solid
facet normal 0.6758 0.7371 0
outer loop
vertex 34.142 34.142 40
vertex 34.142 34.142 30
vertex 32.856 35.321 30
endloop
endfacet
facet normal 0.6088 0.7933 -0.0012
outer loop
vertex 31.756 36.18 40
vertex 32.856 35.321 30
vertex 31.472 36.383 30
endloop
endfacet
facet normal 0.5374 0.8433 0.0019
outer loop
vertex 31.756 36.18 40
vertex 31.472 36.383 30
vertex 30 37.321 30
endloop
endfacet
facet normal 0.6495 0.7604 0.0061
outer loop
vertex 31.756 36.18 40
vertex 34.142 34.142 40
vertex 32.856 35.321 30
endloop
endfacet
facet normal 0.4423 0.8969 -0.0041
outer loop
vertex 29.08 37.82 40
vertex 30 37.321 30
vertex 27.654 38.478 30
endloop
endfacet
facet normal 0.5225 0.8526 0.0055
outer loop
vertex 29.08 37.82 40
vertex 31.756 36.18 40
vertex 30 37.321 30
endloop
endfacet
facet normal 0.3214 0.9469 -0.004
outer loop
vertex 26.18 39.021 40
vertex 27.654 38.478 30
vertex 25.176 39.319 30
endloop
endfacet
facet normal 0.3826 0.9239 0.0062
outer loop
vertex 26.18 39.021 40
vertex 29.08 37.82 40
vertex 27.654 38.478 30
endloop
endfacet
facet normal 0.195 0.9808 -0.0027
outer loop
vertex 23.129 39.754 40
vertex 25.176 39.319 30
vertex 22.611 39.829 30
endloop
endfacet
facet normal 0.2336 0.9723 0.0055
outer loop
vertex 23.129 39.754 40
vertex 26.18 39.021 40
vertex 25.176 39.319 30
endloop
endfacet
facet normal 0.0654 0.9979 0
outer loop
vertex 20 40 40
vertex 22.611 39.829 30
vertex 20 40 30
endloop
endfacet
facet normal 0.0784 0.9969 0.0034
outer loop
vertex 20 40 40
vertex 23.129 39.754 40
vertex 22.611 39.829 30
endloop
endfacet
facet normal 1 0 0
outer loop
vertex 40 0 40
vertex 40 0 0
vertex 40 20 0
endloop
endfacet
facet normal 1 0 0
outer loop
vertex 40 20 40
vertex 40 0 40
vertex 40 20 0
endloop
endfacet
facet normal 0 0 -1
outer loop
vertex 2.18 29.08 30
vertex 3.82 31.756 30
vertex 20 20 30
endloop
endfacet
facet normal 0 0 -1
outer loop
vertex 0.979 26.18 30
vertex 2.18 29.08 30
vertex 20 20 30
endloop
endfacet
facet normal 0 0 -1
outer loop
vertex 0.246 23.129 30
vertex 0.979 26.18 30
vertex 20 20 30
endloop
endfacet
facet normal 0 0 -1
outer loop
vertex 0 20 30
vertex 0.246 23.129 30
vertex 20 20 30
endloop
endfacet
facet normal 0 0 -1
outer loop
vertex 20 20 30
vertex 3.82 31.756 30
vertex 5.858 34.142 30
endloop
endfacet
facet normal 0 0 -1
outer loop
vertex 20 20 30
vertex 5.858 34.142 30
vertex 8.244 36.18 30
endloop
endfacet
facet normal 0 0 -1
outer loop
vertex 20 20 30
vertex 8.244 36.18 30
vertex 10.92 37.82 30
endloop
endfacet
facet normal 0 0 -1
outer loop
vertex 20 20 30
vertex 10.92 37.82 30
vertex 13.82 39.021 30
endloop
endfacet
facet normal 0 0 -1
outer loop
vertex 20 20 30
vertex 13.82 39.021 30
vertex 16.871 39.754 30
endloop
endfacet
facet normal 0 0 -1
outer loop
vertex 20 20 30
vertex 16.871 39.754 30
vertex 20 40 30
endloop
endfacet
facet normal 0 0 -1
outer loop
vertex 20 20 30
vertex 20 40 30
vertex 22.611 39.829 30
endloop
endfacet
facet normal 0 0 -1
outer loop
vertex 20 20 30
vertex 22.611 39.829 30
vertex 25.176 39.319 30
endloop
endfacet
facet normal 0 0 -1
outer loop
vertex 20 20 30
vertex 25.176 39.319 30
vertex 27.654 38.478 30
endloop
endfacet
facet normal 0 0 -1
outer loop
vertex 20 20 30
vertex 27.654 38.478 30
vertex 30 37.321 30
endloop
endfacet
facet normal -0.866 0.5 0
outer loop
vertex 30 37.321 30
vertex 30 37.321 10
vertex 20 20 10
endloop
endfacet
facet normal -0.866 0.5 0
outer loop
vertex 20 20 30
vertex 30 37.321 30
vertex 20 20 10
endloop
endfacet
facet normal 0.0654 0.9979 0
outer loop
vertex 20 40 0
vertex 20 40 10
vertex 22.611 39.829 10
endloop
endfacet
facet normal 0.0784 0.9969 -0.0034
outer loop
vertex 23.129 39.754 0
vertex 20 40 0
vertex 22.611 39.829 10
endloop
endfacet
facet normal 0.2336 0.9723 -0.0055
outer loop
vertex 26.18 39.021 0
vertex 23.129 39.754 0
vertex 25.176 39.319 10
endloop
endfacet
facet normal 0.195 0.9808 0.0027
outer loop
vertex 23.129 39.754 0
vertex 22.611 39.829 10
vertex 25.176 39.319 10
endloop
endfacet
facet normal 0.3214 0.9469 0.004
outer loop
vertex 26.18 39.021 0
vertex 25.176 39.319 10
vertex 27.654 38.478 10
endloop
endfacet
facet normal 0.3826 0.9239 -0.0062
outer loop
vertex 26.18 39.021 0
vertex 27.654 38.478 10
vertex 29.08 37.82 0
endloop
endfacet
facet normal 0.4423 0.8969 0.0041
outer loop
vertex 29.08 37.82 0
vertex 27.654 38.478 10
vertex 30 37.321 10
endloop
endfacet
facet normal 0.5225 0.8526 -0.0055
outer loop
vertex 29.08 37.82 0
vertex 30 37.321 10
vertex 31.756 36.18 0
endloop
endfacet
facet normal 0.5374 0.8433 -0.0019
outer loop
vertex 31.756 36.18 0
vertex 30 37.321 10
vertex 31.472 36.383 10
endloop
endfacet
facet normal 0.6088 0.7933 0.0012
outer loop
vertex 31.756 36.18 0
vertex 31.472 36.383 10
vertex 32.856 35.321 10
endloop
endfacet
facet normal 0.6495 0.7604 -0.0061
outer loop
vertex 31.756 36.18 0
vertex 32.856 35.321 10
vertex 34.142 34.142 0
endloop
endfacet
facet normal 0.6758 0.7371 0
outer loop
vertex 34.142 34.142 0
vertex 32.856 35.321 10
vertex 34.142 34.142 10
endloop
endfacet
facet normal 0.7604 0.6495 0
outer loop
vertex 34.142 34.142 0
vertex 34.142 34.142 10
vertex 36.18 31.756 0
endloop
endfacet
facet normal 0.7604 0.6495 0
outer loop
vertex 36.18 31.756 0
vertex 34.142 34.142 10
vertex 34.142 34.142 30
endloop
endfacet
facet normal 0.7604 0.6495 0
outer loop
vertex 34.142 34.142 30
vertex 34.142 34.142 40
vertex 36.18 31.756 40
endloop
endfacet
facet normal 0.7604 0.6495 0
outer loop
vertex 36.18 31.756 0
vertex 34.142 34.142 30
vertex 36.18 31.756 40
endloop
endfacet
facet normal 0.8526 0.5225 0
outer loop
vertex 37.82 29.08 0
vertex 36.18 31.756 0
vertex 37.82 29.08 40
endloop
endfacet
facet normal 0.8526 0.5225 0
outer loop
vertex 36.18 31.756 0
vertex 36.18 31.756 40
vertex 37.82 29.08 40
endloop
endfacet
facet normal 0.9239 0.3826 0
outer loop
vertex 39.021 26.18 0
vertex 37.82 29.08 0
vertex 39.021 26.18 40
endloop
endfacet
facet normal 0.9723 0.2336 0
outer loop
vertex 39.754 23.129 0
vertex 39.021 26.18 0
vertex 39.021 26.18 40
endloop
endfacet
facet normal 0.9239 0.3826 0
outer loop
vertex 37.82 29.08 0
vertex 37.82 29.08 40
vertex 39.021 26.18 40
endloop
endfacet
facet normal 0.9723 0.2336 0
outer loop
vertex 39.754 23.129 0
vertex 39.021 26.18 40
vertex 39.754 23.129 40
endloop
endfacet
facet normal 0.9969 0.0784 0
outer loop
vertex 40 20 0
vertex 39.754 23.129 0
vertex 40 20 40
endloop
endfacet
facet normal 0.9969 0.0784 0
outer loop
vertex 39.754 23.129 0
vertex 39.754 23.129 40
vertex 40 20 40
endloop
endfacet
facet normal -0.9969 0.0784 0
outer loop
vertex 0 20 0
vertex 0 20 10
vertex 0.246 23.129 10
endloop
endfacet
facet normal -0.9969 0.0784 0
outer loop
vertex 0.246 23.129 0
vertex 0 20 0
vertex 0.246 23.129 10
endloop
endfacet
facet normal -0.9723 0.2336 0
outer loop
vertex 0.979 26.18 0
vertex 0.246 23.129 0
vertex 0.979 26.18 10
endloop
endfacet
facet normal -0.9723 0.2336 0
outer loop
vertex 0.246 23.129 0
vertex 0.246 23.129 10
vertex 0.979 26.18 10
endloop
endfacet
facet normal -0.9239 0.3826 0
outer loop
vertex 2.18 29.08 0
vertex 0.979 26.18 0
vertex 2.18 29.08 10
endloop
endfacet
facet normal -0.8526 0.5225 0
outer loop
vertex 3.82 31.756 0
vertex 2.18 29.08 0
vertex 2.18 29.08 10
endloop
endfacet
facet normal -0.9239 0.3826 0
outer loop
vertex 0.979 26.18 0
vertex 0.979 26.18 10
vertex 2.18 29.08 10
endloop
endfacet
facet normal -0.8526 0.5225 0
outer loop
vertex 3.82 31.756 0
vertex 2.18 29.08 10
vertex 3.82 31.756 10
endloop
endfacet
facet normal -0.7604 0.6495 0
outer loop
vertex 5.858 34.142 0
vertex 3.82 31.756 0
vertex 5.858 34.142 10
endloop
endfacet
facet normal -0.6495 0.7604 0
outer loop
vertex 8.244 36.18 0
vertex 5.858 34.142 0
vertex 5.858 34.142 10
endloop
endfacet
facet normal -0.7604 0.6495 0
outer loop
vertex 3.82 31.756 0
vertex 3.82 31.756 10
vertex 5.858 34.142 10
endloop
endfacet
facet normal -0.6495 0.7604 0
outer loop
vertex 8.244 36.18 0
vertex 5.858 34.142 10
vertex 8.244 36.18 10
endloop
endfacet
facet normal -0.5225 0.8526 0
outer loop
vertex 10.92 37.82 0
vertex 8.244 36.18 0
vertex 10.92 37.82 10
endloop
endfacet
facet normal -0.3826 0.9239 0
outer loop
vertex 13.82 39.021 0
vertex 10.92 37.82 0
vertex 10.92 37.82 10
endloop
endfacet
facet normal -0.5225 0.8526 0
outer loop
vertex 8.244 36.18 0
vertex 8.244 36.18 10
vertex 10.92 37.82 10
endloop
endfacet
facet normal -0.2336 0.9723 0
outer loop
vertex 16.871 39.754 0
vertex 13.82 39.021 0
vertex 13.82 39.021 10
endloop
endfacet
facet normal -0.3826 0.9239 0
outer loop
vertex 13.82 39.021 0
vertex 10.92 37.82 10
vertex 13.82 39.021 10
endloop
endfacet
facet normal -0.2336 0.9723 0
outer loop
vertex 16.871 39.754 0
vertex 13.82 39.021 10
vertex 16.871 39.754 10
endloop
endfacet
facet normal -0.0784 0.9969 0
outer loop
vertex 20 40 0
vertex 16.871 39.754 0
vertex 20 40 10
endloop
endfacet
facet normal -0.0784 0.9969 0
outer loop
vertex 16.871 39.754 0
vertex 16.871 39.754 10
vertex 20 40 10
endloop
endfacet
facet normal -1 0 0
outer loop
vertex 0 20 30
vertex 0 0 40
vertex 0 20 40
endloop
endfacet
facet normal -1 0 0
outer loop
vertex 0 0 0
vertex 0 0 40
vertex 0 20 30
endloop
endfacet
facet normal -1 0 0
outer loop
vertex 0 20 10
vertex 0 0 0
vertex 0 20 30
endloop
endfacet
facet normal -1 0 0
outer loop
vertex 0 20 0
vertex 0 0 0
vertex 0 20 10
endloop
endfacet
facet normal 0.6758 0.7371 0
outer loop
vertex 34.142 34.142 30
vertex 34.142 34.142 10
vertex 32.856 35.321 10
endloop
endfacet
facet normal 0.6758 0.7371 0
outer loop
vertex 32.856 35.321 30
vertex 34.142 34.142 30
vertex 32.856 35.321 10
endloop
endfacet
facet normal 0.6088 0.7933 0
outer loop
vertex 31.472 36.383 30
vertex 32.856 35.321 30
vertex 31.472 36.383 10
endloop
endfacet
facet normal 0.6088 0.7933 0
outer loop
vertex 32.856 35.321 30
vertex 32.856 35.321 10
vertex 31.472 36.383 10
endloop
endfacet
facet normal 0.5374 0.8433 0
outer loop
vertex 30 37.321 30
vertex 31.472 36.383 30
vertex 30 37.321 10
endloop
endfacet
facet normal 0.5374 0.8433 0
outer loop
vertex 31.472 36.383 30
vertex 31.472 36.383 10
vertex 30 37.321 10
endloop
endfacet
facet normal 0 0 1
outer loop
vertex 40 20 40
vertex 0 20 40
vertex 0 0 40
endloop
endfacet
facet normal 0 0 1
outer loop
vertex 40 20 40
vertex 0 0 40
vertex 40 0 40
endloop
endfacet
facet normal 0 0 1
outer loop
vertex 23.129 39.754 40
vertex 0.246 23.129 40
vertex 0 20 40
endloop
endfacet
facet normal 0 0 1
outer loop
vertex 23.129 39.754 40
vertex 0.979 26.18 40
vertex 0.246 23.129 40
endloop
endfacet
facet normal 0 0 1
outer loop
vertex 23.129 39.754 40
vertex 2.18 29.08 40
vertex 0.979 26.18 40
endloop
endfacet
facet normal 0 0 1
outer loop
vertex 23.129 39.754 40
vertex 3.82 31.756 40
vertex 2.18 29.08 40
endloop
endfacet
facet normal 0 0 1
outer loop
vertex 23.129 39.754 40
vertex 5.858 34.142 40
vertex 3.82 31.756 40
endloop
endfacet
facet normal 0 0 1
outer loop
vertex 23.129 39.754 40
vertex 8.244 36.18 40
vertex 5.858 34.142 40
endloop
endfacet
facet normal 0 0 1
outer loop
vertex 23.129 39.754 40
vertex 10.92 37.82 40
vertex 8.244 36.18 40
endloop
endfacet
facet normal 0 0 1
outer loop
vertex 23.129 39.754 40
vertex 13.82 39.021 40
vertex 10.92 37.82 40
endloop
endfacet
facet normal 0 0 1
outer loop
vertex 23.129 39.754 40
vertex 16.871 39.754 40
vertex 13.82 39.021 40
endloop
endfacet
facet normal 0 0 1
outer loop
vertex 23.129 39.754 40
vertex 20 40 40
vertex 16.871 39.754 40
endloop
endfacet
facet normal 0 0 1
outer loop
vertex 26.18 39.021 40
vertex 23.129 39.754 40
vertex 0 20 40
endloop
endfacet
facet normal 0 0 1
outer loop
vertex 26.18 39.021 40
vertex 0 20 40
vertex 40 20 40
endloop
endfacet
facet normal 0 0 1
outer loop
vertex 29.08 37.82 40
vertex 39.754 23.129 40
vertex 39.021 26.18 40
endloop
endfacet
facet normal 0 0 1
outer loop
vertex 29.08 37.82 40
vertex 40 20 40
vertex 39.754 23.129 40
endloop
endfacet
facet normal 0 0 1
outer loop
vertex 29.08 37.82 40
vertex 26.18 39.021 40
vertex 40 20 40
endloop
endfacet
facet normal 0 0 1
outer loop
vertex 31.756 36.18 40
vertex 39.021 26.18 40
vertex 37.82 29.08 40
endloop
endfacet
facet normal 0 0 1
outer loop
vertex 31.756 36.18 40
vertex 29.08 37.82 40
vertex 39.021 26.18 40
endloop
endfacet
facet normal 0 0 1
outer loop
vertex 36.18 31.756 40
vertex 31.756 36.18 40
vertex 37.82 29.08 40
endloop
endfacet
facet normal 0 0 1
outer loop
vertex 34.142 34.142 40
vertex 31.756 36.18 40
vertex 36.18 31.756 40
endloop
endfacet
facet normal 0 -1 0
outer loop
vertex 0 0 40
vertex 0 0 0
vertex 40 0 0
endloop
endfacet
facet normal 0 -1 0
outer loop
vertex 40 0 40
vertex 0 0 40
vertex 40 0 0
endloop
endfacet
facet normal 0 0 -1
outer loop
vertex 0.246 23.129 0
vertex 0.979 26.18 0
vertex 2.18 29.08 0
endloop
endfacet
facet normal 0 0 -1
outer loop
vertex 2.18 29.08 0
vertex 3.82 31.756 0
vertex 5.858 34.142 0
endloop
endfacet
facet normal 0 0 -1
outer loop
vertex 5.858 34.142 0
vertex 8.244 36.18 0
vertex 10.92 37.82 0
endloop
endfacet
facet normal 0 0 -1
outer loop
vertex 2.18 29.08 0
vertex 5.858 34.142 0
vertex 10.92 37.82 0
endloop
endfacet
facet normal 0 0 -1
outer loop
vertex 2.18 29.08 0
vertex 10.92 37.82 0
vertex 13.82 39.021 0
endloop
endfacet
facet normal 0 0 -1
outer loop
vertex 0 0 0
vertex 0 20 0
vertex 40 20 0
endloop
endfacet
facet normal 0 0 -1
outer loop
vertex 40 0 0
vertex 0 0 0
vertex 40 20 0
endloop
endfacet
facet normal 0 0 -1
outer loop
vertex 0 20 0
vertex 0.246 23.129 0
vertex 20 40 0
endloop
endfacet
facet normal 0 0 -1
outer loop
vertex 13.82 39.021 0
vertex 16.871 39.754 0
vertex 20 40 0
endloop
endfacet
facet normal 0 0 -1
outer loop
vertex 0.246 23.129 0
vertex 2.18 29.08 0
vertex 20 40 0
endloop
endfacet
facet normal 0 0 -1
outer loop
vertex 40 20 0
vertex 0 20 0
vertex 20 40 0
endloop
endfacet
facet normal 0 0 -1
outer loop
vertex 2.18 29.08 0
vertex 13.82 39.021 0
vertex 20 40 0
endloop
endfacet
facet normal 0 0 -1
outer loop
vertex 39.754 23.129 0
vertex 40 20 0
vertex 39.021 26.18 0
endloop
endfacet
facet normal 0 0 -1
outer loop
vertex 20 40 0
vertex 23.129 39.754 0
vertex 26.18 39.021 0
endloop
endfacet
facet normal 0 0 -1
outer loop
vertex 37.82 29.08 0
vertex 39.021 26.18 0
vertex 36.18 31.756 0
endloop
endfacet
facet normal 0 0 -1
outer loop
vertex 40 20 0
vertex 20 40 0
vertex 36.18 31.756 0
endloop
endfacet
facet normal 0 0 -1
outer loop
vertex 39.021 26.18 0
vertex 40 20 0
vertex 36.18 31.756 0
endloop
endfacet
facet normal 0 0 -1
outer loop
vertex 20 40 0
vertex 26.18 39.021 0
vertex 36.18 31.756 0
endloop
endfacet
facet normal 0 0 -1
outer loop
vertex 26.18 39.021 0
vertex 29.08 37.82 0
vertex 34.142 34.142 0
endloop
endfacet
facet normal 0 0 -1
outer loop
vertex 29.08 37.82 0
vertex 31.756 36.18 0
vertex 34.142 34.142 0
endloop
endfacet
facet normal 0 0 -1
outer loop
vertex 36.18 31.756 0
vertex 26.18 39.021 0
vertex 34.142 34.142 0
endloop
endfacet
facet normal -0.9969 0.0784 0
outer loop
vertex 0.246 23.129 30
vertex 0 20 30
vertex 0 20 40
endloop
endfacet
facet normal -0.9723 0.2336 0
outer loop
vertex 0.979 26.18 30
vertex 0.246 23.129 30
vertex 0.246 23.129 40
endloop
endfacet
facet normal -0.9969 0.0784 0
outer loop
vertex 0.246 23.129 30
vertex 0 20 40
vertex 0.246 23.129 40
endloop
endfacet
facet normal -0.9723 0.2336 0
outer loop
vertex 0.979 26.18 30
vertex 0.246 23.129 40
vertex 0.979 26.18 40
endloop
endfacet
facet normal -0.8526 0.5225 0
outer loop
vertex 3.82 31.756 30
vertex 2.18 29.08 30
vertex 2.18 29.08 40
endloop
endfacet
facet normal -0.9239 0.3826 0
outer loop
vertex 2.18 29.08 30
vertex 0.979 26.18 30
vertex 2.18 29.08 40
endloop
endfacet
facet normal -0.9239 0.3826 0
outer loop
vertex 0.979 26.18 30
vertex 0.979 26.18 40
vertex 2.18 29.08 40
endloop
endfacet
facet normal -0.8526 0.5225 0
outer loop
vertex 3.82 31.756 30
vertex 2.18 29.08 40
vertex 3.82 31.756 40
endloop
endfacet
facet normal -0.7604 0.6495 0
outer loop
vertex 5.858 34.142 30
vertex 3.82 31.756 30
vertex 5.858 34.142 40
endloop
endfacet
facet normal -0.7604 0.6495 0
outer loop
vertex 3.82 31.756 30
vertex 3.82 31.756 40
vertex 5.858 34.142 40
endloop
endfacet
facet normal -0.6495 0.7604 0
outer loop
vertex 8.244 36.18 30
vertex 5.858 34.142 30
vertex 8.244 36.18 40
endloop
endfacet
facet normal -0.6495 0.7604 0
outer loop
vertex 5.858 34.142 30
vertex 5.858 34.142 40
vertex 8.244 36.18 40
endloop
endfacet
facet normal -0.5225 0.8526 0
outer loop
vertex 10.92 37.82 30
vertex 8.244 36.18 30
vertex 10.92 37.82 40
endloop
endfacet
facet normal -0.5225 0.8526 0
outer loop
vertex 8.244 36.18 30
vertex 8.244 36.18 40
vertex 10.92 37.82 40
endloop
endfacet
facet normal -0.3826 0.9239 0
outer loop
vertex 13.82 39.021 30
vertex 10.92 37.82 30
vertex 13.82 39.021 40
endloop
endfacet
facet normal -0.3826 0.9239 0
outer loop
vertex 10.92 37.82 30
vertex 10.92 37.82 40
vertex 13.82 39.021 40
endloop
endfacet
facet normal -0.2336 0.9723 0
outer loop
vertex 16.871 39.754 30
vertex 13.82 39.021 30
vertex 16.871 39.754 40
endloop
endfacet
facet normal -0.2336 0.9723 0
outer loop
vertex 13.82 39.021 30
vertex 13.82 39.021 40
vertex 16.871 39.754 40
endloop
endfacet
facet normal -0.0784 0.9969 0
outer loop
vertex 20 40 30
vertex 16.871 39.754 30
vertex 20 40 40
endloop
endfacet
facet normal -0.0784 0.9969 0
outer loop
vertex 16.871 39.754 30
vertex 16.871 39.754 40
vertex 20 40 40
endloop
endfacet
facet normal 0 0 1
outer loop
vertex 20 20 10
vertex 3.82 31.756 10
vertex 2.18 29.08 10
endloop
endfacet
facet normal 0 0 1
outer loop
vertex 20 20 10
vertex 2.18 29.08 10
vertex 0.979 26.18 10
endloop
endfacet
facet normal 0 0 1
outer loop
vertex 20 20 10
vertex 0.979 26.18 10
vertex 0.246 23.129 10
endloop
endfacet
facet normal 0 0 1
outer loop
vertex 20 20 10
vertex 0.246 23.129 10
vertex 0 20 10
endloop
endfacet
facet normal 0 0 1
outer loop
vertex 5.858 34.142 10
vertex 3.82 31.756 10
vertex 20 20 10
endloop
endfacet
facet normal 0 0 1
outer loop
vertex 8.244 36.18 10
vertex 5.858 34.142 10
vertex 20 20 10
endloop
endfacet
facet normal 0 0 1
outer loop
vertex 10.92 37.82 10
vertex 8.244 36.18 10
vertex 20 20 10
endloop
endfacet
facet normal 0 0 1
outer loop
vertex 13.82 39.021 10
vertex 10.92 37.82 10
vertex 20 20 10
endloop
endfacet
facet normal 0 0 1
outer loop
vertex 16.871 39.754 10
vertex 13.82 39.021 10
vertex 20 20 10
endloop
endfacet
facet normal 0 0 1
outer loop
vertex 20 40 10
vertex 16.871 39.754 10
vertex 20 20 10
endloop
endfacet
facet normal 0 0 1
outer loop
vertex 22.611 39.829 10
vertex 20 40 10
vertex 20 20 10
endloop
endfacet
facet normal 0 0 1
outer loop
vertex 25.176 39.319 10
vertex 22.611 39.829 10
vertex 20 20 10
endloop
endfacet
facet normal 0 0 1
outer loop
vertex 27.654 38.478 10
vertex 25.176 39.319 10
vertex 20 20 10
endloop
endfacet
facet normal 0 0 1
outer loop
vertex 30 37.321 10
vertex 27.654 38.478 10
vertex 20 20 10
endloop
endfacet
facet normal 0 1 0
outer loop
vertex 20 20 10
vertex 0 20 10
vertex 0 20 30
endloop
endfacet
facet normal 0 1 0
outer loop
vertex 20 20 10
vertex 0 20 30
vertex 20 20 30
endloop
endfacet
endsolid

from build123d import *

# Parameters (mm, degrees)
SKETCH1_W           = 40
SKETCH1_H           = 40
BOSS_EXTRUDE1_DEPTH = 40
CUT_EXTRUDE1_DEPTH  = 40
CUT_EXTRUDE2_DEPTH  = 20
CUT_EXTRUDE3_DEPTH  = 30
BOSS_EXTRUDE2_DEPTH = 10
BOSS_EXTRUDE3_DEPTH = 20


with BuildPart() as part:
    # Sketch1 → Boss-Extrude1 (new body)
    with BuildSketch(Plane.XY):
        with Locations((20, 20)):
            Rectangle(SKETCH1_W, SKETCH1_H)
    extrude(amount=BOSS_EXTRUDE1_DEPTH)

    # Sketch2 → Cut-Extrude1 (cut)
    with BuildSketch(Plane.XY.offset(40)):
        with BuildLine():
            Line((0, 40), (0, 20))
            ThreePointArc((0, 20), (5.857864376, 34.142135624), (20, 40))
            Line((20, 40), (0, 40))
        make_face()
        with BuildLine():
            Line((40, 40), (20, 40))
            ThreePointArc((20, 40), (34.142135624, 34.142135624), (40, 20))
            Line((40, 20), (40, 40))
        make_face()
    extrude(amount=-CUT_EXTRUDE1_DEPTH, mode=Mode.SUBTRACT)

    # Sketch3 → Cut-Extrude2 (cut)
    with BuildSketch(Plane.XY.offset(10)):
        with BuildLine():
            Line((0, 20), (20, 20))
            Line((20, 20), (20, 40))
            ThreePointArc((20, 40), (5.857864376, 34.142135624), (0, 20))
        make_face()
    extrude(amount=CUT_EXTRUDE2_DEPTH, mode=Mode.SUBTRACT)

    # Sketch4 → Cut-Extrude3 (cut)
    with BuildSketch(Plane.XY.offset(40)):
        with BuildLine():
            Line((20, 20), (20, 40))
            ThreePointArc((20, 40), (27.653668647, 38.47759065), (34.142135624, 34.142135624))
            Line((34.142135624, 34.142135624), (20, 20))
        make_face()
    extrude(amount=-CUT_EXTRUDE3_DEPTH, mode=Mode.SUBTRACT)

    # Sketch5 → Boss-Extrude2 (add)
    with BuildSketch(Plane.XY.offset(40)):
        with BuildLine():
            Line((20, 40), (20, 20))
            Line((20, 20), (34.142135624, 34.142135624))
            ThreePointArc((34.142135624, 34.142135624), (27.653668647, 38.47759065), (20, 40))
        make_face()
    extrude(amount=-BOSS_EXTRUDE2_DEPTH)

    # Sketch6 → Boss-Extrude3 (add)
    with BuildSketch(Plane.XY.offset(10)):
        with BuildLine():
            Line((20, 20), (34.142135624, 34.142135624))
            ThreePointArc((34.142135624, 34.142135624), (32.17522858, 35.867066806), (30, 37.320508076))
            Line((30, 37.320508076), (20, 20))
        make_face()
    extrude(amount=BOSS_EXTRUDE3_DEPTH)


solid = part.part
